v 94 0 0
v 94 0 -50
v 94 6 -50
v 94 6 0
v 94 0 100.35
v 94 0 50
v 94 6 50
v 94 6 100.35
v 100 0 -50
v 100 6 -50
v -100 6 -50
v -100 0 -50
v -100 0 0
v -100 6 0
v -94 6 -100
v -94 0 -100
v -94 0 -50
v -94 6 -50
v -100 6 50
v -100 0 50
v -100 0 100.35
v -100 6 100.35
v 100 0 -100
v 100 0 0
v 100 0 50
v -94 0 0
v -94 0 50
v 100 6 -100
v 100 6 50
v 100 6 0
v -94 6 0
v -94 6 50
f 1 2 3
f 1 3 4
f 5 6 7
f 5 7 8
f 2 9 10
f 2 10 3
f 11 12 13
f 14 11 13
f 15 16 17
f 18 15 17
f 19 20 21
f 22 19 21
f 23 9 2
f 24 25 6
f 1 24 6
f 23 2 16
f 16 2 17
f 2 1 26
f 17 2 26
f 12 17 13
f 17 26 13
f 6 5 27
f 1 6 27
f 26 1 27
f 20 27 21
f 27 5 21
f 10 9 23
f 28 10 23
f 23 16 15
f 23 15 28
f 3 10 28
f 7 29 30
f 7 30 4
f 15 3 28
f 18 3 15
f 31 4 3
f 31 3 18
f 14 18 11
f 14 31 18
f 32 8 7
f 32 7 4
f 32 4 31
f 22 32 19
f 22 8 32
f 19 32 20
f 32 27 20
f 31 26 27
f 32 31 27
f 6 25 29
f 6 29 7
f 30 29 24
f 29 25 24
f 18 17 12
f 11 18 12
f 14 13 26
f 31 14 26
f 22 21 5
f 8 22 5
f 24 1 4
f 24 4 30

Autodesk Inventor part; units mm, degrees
ref_plane "YZ Plane" through (0, 0, 0) normal (1, 0, 0) x (0, 1, 0)
ref_plane "XZ Plane" through (0, 0, 0) normal (0, 1, 0) x (-1, 0, 0)
ref_plane "XY Plane" through (0, 0, 0) normal (0, 0, 1) x (1, 0, 0)
sketch "Sketch1" plane through (0, 0, 0) normal (0, 1, 0) x (-1, 0, 0)
  line L0 (100, 100.3504) -> (-94, 100.3504)
  line L1 (94, -100) -> (94, -50)
  line L2 (94, -50) -> (100, -50)
  line L3 (100, 0) -> (94, 0)
  line L4 (-100, -50) -> (-94, -50)
  line L5 (-94, -50) -> (-94, 0)
  line L6 (-94, 0) -> (-100, 0)
  line L7 (94, 0) -> (94, 50)
  line L8 (94, 50) -> (100, 50)
  line L9 (94, 0) -> (100, 0)
  line L10 (-100, 50) -> (-94, 50)
  line L11 (-94, 50) -> (-94, 100.3504)
  line L12 (94, -100) -> (-100, -100)
  line L13 (100, -50) -> (100, 0)
  line L14 (100, 50) -> (100, 100.3504)
  line L15 (-100, 50) -> (-100, 0)
  line L16 (-100, -50) -> (-100, -100)
  point P0 (0, 0)
  dimension "d23" = 50
  dimension "d25" = 6
  dimension "d26" = 50
  dimension "d27" = 50
extrude "Extrusion2" add sketch "Sketch1" along normal blind 6
properties part number "simple wall test"
